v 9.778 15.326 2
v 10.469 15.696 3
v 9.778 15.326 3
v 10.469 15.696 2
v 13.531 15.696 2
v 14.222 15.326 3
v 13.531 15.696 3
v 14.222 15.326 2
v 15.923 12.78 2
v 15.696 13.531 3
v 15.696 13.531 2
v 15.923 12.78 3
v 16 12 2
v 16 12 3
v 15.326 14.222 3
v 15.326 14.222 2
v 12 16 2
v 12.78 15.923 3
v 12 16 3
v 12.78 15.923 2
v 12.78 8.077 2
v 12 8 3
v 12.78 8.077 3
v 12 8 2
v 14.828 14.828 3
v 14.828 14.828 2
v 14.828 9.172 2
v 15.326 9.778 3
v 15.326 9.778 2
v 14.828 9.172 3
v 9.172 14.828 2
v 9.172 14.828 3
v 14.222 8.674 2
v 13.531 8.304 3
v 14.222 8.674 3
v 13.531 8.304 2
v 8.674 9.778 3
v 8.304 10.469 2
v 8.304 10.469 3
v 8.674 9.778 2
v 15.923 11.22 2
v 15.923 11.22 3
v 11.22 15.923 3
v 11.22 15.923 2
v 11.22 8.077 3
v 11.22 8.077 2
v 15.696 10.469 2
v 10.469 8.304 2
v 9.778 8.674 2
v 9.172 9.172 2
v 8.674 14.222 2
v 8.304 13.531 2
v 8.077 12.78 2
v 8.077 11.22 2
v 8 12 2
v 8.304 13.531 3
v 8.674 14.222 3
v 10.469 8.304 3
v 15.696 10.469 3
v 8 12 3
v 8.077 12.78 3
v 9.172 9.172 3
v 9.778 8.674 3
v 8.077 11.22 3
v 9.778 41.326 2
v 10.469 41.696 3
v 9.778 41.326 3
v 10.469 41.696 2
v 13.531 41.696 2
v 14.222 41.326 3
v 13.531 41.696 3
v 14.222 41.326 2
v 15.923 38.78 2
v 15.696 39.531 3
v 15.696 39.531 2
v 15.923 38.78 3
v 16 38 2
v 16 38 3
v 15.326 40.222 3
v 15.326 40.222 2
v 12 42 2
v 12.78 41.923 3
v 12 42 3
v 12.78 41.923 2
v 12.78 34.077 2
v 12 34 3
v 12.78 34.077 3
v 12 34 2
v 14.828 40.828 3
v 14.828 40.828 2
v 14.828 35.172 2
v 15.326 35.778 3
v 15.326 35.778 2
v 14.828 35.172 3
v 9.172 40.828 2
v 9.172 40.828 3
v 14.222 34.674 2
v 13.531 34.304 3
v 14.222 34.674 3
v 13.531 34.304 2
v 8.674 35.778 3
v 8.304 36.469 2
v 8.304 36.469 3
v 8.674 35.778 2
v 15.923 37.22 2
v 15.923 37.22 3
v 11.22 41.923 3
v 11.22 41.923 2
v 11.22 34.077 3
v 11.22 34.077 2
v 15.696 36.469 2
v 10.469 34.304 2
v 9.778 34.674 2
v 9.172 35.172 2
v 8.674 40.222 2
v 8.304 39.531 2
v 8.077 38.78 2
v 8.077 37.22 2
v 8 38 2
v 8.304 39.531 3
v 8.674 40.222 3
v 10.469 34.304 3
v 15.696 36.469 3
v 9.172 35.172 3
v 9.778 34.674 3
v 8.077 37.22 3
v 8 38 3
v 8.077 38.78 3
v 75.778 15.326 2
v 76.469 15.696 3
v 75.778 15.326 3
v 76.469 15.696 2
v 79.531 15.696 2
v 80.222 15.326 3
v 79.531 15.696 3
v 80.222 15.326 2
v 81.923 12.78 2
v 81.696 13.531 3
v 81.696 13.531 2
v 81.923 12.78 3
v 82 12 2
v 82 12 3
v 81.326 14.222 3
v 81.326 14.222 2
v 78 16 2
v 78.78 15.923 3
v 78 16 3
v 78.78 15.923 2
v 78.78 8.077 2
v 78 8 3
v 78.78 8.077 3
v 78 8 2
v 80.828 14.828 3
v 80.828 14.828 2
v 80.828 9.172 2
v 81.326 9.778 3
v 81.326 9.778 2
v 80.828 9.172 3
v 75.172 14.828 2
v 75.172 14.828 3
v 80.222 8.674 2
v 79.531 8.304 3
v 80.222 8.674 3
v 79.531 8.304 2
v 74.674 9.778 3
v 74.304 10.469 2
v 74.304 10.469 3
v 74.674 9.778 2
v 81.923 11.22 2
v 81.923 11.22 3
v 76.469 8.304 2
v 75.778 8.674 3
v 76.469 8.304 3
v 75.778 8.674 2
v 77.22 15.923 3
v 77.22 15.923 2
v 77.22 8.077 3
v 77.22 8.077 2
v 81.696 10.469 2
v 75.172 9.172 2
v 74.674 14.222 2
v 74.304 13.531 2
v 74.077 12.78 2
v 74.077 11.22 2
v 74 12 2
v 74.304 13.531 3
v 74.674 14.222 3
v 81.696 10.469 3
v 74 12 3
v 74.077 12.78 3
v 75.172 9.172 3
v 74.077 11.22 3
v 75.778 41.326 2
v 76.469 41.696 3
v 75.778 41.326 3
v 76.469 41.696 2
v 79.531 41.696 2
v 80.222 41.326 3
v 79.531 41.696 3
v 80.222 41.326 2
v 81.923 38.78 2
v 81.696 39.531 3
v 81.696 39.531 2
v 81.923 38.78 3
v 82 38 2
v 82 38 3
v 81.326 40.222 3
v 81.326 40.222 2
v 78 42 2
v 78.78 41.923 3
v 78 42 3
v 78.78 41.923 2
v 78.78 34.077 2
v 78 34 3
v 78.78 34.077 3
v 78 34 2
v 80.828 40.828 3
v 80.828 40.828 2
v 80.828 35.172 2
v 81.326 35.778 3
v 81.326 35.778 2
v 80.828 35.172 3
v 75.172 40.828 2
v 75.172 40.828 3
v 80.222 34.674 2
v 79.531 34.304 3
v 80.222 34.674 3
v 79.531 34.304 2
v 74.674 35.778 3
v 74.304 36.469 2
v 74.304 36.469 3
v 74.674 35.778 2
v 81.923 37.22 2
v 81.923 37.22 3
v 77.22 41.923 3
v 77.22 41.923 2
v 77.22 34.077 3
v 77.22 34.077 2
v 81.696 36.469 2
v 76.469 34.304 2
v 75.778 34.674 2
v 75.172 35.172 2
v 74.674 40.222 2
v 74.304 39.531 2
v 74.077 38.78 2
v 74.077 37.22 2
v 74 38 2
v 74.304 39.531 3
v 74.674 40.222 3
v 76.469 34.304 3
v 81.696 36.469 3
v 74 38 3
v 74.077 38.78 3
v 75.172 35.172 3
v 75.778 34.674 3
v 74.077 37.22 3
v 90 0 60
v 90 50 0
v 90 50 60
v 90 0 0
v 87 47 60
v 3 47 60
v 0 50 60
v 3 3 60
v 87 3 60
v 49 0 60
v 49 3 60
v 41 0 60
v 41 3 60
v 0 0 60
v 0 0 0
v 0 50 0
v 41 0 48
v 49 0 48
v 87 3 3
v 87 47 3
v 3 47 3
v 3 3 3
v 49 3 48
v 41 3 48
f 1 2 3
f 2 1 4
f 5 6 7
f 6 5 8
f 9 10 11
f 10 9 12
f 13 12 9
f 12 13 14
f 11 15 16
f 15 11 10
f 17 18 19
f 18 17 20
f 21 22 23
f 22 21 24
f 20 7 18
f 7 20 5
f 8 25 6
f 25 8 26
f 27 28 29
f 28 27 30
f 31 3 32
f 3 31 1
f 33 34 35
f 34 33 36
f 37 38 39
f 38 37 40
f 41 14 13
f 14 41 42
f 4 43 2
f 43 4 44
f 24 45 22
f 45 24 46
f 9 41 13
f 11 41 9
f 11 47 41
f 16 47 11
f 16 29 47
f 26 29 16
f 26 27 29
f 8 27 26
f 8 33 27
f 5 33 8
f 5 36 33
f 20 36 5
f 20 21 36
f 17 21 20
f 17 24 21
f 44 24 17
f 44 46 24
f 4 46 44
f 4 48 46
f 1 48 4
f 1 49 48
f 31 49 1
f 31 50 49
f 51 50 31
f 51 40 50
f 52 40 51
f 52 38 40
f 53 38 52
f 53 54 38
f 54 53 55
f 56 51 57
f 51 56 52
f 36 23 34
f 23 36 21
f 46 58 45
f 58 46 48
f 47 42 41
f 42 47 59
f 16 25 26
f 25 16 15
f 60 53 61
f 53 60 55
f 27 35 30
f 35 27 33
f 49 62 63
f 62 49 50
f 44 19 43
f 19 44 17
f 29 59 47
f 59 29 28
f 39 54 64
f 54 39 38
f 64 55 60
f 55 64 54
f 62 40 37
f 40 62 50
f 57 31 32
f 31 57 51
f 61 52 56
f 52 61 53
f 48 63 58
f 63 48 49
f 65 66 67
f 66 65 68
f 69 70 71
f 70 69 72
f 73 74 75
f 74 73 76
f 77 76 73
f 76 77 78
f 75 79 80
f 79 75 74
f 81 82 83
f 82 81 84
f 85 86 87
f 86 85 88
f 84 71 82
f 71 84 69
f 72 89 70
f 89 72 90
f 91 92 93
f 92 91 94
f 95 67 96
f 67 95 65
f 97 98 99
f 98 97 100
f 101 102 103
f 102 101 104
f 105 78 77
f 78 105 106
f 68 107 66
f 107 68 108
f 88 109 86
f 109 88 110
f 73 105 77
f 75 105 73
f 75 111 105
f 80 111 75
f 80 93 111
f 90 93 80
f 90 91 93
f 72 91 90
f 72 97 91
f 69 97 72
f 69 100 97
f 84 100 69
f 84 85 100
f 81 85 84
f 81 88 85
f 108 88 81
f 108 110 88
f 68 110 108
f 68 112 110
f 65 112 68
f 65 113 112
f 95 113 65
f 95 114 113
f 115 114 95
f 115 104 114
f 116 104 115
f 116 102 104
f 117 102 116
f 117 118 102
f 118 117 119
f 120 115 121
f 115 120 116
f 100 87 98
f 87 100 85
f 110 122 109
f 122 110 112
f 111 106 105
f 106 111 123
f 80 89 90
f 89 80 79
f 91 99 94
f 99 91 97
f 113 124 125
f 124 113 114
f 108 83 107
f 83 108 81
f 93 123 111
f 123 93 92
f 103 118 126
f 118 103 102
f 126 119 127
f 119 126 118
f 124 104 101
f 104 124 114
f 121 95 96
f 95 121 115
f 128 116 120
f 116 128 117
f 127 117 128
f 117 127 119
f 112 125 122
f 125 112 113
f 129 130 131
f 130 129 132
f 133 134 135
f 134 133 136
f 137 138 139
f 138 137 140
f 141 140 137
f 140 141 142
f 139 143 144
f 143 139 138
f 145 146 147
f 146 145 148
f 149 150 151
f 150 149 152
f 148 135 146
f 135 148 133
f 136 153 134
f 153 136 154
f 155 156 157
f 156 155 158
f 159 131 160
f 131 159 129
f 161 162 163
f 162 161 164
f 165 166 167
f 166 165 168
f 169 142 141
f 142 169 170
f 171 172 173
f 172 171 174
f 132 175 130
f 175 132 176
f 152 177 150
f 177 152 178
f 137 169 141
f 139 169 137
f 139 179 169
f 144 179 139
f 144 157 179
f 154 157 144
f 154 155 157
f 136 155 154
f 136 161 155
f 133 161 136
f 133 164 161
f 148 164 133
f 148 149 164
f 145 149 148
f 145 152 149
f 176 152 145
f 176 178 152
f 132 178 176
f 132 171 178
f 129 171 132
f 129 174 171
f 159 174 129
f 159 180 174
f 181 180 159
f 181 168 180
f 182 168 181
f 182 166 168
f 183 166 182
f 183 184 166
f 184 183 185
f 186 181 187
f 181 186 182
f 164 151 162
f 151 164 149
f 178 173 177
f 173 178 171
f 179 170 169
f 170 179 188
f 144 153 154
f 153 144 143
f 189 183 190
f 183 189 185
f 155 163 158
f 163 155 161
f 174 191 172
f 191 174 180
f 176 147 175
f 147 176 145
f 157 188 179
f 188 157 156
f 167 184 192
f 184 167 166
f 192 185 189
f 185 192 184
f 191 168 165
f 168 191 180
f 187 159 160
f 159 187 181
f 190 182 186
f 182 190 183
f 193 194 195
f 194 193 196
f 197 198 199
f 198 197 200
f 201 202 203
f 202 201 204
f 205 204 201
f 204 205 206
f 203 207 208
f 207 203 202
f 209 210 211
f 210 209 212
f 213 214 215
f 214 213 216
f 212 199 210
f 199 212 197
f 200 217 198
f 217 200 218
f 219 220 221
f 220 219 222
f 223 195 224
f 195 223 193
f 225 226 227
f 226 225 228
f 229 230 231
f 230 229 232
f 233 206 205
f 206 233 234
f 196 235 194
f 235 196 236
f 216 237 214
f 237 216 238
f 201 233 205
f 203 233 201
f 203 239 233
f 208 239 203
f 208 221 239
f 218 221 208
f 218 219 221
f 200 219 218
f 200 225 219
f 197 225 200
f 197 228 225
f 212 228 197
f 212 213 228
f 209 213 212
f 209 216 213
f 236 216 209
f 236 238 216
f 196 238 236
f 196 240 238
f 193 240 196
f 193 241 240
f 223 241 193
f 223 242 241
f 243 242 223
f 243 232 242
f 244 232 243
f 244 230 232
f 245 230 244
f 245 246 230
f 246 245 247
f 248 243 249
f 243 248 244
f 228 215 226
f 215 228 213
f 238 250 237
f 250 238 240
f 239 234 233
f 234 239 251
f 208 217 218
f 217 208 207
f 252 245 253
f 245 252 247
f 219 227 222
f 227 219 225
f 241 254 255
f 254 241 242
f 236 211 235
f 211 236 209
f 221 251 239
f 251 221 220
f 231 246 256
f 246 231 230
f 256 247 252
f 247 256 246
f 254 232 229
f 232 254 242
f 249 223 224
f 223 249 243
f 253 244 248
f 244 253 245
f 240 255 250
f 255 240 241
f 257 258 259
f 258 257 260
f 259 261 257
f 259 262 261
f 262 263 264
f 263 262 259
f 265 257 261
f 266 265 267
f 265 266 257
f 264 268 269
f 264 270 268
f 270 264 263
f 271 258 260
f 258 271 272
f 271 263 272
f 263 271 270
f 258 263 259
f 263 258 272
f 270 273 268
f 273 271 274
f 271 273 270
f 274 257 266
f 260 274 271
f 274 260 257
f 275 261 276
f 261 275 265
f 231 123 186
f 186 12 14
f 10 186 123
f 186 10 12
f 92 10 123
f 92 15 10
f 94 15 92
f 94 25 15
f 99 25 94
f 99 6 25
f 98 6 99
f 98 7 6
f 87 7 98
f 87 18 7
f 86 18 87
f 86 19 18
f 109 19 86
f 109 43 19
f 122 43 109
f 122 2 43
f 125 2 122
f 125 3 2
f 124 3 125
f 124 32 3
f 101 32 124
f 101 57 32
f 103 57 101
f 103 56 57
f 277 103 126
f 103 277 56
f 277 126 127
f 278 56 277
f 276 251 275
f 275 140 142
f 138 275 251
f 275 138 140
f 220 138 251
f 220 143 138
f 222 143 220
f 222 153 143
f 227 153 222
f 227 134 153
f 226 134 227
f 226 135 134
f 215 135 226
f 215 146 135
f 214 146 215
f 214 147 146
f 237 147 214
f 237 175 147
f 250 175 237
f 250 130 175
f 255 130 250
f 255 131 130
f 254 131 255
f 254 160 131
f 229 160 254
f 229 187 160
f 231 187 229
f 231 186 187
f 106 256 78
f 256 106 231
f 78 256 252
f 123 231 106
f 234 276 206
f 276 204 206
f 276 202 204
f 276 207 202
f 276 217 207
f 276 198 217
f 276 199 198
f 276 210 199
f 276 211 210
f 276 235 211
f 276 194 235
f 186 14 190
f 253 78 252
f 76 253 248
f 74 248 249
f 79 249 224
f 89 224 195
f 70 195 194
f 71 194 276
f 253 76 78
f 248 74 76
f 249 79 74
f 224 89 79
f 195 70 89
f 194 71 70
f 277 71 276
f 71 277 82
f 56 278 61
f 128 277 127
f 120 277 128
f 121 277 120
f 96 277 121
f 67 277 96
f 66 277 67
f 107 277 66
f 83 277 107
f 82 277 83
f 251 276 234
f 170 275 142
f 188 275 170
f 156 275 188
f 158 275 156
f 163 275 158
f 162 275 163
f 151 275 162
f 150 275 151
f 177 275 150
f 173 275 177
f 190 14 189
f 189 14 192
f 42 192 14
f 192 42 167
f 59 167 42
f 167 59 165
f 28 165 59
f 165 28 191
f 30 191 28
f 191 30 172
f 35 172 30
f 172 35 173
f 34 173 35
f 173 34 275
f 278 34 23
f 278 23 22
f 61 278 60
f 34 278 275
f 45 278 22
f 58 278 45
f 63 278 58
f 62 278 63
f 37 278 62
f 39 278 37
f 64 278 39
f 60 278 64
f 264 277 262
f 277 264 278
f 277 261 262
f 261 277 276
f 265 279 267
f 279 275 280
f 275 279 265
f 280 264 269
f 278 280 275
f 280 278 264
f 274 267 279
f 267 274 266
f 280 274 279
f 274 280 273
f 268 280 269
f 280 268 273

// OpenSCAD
$fn = 32;

// ----------------------------------------------------------------------
// Enclosure box: both enclosure
// ----------------------------------------------------------------------

// --- parameters (mm) ---
box_l = 90;               // outer length, X
box_w = 50;               // outer width, Y
box_h = 60;               // outer height
wall_t = 3;               // wall thickness
boss_r = 4;               // corner boss radius
hole_r = 1.5;             // boss screw hole radius
boss_in = 12;             // boss inset from the corners
notch_w = 8;              // cable notch width
notch_h = 12;             // cable notch height

inner_h = box_h - wall_t;  // cavity depth
boss_h = inner_h - 2;  // corner boss height

difference() {
  cube([box_l, box_w, box_h]);
  translate([wall_t, wall_t, wall_t])
    cube([box_l - 2 * wall_t, box_w - 2 * wall_t, box_h]);
  for (sx = [0, 1], sy = [0, 1])
    translate([sx ? box_l - boss_in : boss_in,
               sy ? box_w - boss_in : boss_in, wall_t - 1]) {
      cylinder(r = boss_r, h = boss_h);
      translate([0, 0, boss_h - 4])
        cylinder(r = hole_r, h = 5);
    }
  translate([box_l / 2 - notch_w / 2, -1, box_h - notch_h])
    cube([notch_w, wall_t + 2, notch_h + 1]);
}
